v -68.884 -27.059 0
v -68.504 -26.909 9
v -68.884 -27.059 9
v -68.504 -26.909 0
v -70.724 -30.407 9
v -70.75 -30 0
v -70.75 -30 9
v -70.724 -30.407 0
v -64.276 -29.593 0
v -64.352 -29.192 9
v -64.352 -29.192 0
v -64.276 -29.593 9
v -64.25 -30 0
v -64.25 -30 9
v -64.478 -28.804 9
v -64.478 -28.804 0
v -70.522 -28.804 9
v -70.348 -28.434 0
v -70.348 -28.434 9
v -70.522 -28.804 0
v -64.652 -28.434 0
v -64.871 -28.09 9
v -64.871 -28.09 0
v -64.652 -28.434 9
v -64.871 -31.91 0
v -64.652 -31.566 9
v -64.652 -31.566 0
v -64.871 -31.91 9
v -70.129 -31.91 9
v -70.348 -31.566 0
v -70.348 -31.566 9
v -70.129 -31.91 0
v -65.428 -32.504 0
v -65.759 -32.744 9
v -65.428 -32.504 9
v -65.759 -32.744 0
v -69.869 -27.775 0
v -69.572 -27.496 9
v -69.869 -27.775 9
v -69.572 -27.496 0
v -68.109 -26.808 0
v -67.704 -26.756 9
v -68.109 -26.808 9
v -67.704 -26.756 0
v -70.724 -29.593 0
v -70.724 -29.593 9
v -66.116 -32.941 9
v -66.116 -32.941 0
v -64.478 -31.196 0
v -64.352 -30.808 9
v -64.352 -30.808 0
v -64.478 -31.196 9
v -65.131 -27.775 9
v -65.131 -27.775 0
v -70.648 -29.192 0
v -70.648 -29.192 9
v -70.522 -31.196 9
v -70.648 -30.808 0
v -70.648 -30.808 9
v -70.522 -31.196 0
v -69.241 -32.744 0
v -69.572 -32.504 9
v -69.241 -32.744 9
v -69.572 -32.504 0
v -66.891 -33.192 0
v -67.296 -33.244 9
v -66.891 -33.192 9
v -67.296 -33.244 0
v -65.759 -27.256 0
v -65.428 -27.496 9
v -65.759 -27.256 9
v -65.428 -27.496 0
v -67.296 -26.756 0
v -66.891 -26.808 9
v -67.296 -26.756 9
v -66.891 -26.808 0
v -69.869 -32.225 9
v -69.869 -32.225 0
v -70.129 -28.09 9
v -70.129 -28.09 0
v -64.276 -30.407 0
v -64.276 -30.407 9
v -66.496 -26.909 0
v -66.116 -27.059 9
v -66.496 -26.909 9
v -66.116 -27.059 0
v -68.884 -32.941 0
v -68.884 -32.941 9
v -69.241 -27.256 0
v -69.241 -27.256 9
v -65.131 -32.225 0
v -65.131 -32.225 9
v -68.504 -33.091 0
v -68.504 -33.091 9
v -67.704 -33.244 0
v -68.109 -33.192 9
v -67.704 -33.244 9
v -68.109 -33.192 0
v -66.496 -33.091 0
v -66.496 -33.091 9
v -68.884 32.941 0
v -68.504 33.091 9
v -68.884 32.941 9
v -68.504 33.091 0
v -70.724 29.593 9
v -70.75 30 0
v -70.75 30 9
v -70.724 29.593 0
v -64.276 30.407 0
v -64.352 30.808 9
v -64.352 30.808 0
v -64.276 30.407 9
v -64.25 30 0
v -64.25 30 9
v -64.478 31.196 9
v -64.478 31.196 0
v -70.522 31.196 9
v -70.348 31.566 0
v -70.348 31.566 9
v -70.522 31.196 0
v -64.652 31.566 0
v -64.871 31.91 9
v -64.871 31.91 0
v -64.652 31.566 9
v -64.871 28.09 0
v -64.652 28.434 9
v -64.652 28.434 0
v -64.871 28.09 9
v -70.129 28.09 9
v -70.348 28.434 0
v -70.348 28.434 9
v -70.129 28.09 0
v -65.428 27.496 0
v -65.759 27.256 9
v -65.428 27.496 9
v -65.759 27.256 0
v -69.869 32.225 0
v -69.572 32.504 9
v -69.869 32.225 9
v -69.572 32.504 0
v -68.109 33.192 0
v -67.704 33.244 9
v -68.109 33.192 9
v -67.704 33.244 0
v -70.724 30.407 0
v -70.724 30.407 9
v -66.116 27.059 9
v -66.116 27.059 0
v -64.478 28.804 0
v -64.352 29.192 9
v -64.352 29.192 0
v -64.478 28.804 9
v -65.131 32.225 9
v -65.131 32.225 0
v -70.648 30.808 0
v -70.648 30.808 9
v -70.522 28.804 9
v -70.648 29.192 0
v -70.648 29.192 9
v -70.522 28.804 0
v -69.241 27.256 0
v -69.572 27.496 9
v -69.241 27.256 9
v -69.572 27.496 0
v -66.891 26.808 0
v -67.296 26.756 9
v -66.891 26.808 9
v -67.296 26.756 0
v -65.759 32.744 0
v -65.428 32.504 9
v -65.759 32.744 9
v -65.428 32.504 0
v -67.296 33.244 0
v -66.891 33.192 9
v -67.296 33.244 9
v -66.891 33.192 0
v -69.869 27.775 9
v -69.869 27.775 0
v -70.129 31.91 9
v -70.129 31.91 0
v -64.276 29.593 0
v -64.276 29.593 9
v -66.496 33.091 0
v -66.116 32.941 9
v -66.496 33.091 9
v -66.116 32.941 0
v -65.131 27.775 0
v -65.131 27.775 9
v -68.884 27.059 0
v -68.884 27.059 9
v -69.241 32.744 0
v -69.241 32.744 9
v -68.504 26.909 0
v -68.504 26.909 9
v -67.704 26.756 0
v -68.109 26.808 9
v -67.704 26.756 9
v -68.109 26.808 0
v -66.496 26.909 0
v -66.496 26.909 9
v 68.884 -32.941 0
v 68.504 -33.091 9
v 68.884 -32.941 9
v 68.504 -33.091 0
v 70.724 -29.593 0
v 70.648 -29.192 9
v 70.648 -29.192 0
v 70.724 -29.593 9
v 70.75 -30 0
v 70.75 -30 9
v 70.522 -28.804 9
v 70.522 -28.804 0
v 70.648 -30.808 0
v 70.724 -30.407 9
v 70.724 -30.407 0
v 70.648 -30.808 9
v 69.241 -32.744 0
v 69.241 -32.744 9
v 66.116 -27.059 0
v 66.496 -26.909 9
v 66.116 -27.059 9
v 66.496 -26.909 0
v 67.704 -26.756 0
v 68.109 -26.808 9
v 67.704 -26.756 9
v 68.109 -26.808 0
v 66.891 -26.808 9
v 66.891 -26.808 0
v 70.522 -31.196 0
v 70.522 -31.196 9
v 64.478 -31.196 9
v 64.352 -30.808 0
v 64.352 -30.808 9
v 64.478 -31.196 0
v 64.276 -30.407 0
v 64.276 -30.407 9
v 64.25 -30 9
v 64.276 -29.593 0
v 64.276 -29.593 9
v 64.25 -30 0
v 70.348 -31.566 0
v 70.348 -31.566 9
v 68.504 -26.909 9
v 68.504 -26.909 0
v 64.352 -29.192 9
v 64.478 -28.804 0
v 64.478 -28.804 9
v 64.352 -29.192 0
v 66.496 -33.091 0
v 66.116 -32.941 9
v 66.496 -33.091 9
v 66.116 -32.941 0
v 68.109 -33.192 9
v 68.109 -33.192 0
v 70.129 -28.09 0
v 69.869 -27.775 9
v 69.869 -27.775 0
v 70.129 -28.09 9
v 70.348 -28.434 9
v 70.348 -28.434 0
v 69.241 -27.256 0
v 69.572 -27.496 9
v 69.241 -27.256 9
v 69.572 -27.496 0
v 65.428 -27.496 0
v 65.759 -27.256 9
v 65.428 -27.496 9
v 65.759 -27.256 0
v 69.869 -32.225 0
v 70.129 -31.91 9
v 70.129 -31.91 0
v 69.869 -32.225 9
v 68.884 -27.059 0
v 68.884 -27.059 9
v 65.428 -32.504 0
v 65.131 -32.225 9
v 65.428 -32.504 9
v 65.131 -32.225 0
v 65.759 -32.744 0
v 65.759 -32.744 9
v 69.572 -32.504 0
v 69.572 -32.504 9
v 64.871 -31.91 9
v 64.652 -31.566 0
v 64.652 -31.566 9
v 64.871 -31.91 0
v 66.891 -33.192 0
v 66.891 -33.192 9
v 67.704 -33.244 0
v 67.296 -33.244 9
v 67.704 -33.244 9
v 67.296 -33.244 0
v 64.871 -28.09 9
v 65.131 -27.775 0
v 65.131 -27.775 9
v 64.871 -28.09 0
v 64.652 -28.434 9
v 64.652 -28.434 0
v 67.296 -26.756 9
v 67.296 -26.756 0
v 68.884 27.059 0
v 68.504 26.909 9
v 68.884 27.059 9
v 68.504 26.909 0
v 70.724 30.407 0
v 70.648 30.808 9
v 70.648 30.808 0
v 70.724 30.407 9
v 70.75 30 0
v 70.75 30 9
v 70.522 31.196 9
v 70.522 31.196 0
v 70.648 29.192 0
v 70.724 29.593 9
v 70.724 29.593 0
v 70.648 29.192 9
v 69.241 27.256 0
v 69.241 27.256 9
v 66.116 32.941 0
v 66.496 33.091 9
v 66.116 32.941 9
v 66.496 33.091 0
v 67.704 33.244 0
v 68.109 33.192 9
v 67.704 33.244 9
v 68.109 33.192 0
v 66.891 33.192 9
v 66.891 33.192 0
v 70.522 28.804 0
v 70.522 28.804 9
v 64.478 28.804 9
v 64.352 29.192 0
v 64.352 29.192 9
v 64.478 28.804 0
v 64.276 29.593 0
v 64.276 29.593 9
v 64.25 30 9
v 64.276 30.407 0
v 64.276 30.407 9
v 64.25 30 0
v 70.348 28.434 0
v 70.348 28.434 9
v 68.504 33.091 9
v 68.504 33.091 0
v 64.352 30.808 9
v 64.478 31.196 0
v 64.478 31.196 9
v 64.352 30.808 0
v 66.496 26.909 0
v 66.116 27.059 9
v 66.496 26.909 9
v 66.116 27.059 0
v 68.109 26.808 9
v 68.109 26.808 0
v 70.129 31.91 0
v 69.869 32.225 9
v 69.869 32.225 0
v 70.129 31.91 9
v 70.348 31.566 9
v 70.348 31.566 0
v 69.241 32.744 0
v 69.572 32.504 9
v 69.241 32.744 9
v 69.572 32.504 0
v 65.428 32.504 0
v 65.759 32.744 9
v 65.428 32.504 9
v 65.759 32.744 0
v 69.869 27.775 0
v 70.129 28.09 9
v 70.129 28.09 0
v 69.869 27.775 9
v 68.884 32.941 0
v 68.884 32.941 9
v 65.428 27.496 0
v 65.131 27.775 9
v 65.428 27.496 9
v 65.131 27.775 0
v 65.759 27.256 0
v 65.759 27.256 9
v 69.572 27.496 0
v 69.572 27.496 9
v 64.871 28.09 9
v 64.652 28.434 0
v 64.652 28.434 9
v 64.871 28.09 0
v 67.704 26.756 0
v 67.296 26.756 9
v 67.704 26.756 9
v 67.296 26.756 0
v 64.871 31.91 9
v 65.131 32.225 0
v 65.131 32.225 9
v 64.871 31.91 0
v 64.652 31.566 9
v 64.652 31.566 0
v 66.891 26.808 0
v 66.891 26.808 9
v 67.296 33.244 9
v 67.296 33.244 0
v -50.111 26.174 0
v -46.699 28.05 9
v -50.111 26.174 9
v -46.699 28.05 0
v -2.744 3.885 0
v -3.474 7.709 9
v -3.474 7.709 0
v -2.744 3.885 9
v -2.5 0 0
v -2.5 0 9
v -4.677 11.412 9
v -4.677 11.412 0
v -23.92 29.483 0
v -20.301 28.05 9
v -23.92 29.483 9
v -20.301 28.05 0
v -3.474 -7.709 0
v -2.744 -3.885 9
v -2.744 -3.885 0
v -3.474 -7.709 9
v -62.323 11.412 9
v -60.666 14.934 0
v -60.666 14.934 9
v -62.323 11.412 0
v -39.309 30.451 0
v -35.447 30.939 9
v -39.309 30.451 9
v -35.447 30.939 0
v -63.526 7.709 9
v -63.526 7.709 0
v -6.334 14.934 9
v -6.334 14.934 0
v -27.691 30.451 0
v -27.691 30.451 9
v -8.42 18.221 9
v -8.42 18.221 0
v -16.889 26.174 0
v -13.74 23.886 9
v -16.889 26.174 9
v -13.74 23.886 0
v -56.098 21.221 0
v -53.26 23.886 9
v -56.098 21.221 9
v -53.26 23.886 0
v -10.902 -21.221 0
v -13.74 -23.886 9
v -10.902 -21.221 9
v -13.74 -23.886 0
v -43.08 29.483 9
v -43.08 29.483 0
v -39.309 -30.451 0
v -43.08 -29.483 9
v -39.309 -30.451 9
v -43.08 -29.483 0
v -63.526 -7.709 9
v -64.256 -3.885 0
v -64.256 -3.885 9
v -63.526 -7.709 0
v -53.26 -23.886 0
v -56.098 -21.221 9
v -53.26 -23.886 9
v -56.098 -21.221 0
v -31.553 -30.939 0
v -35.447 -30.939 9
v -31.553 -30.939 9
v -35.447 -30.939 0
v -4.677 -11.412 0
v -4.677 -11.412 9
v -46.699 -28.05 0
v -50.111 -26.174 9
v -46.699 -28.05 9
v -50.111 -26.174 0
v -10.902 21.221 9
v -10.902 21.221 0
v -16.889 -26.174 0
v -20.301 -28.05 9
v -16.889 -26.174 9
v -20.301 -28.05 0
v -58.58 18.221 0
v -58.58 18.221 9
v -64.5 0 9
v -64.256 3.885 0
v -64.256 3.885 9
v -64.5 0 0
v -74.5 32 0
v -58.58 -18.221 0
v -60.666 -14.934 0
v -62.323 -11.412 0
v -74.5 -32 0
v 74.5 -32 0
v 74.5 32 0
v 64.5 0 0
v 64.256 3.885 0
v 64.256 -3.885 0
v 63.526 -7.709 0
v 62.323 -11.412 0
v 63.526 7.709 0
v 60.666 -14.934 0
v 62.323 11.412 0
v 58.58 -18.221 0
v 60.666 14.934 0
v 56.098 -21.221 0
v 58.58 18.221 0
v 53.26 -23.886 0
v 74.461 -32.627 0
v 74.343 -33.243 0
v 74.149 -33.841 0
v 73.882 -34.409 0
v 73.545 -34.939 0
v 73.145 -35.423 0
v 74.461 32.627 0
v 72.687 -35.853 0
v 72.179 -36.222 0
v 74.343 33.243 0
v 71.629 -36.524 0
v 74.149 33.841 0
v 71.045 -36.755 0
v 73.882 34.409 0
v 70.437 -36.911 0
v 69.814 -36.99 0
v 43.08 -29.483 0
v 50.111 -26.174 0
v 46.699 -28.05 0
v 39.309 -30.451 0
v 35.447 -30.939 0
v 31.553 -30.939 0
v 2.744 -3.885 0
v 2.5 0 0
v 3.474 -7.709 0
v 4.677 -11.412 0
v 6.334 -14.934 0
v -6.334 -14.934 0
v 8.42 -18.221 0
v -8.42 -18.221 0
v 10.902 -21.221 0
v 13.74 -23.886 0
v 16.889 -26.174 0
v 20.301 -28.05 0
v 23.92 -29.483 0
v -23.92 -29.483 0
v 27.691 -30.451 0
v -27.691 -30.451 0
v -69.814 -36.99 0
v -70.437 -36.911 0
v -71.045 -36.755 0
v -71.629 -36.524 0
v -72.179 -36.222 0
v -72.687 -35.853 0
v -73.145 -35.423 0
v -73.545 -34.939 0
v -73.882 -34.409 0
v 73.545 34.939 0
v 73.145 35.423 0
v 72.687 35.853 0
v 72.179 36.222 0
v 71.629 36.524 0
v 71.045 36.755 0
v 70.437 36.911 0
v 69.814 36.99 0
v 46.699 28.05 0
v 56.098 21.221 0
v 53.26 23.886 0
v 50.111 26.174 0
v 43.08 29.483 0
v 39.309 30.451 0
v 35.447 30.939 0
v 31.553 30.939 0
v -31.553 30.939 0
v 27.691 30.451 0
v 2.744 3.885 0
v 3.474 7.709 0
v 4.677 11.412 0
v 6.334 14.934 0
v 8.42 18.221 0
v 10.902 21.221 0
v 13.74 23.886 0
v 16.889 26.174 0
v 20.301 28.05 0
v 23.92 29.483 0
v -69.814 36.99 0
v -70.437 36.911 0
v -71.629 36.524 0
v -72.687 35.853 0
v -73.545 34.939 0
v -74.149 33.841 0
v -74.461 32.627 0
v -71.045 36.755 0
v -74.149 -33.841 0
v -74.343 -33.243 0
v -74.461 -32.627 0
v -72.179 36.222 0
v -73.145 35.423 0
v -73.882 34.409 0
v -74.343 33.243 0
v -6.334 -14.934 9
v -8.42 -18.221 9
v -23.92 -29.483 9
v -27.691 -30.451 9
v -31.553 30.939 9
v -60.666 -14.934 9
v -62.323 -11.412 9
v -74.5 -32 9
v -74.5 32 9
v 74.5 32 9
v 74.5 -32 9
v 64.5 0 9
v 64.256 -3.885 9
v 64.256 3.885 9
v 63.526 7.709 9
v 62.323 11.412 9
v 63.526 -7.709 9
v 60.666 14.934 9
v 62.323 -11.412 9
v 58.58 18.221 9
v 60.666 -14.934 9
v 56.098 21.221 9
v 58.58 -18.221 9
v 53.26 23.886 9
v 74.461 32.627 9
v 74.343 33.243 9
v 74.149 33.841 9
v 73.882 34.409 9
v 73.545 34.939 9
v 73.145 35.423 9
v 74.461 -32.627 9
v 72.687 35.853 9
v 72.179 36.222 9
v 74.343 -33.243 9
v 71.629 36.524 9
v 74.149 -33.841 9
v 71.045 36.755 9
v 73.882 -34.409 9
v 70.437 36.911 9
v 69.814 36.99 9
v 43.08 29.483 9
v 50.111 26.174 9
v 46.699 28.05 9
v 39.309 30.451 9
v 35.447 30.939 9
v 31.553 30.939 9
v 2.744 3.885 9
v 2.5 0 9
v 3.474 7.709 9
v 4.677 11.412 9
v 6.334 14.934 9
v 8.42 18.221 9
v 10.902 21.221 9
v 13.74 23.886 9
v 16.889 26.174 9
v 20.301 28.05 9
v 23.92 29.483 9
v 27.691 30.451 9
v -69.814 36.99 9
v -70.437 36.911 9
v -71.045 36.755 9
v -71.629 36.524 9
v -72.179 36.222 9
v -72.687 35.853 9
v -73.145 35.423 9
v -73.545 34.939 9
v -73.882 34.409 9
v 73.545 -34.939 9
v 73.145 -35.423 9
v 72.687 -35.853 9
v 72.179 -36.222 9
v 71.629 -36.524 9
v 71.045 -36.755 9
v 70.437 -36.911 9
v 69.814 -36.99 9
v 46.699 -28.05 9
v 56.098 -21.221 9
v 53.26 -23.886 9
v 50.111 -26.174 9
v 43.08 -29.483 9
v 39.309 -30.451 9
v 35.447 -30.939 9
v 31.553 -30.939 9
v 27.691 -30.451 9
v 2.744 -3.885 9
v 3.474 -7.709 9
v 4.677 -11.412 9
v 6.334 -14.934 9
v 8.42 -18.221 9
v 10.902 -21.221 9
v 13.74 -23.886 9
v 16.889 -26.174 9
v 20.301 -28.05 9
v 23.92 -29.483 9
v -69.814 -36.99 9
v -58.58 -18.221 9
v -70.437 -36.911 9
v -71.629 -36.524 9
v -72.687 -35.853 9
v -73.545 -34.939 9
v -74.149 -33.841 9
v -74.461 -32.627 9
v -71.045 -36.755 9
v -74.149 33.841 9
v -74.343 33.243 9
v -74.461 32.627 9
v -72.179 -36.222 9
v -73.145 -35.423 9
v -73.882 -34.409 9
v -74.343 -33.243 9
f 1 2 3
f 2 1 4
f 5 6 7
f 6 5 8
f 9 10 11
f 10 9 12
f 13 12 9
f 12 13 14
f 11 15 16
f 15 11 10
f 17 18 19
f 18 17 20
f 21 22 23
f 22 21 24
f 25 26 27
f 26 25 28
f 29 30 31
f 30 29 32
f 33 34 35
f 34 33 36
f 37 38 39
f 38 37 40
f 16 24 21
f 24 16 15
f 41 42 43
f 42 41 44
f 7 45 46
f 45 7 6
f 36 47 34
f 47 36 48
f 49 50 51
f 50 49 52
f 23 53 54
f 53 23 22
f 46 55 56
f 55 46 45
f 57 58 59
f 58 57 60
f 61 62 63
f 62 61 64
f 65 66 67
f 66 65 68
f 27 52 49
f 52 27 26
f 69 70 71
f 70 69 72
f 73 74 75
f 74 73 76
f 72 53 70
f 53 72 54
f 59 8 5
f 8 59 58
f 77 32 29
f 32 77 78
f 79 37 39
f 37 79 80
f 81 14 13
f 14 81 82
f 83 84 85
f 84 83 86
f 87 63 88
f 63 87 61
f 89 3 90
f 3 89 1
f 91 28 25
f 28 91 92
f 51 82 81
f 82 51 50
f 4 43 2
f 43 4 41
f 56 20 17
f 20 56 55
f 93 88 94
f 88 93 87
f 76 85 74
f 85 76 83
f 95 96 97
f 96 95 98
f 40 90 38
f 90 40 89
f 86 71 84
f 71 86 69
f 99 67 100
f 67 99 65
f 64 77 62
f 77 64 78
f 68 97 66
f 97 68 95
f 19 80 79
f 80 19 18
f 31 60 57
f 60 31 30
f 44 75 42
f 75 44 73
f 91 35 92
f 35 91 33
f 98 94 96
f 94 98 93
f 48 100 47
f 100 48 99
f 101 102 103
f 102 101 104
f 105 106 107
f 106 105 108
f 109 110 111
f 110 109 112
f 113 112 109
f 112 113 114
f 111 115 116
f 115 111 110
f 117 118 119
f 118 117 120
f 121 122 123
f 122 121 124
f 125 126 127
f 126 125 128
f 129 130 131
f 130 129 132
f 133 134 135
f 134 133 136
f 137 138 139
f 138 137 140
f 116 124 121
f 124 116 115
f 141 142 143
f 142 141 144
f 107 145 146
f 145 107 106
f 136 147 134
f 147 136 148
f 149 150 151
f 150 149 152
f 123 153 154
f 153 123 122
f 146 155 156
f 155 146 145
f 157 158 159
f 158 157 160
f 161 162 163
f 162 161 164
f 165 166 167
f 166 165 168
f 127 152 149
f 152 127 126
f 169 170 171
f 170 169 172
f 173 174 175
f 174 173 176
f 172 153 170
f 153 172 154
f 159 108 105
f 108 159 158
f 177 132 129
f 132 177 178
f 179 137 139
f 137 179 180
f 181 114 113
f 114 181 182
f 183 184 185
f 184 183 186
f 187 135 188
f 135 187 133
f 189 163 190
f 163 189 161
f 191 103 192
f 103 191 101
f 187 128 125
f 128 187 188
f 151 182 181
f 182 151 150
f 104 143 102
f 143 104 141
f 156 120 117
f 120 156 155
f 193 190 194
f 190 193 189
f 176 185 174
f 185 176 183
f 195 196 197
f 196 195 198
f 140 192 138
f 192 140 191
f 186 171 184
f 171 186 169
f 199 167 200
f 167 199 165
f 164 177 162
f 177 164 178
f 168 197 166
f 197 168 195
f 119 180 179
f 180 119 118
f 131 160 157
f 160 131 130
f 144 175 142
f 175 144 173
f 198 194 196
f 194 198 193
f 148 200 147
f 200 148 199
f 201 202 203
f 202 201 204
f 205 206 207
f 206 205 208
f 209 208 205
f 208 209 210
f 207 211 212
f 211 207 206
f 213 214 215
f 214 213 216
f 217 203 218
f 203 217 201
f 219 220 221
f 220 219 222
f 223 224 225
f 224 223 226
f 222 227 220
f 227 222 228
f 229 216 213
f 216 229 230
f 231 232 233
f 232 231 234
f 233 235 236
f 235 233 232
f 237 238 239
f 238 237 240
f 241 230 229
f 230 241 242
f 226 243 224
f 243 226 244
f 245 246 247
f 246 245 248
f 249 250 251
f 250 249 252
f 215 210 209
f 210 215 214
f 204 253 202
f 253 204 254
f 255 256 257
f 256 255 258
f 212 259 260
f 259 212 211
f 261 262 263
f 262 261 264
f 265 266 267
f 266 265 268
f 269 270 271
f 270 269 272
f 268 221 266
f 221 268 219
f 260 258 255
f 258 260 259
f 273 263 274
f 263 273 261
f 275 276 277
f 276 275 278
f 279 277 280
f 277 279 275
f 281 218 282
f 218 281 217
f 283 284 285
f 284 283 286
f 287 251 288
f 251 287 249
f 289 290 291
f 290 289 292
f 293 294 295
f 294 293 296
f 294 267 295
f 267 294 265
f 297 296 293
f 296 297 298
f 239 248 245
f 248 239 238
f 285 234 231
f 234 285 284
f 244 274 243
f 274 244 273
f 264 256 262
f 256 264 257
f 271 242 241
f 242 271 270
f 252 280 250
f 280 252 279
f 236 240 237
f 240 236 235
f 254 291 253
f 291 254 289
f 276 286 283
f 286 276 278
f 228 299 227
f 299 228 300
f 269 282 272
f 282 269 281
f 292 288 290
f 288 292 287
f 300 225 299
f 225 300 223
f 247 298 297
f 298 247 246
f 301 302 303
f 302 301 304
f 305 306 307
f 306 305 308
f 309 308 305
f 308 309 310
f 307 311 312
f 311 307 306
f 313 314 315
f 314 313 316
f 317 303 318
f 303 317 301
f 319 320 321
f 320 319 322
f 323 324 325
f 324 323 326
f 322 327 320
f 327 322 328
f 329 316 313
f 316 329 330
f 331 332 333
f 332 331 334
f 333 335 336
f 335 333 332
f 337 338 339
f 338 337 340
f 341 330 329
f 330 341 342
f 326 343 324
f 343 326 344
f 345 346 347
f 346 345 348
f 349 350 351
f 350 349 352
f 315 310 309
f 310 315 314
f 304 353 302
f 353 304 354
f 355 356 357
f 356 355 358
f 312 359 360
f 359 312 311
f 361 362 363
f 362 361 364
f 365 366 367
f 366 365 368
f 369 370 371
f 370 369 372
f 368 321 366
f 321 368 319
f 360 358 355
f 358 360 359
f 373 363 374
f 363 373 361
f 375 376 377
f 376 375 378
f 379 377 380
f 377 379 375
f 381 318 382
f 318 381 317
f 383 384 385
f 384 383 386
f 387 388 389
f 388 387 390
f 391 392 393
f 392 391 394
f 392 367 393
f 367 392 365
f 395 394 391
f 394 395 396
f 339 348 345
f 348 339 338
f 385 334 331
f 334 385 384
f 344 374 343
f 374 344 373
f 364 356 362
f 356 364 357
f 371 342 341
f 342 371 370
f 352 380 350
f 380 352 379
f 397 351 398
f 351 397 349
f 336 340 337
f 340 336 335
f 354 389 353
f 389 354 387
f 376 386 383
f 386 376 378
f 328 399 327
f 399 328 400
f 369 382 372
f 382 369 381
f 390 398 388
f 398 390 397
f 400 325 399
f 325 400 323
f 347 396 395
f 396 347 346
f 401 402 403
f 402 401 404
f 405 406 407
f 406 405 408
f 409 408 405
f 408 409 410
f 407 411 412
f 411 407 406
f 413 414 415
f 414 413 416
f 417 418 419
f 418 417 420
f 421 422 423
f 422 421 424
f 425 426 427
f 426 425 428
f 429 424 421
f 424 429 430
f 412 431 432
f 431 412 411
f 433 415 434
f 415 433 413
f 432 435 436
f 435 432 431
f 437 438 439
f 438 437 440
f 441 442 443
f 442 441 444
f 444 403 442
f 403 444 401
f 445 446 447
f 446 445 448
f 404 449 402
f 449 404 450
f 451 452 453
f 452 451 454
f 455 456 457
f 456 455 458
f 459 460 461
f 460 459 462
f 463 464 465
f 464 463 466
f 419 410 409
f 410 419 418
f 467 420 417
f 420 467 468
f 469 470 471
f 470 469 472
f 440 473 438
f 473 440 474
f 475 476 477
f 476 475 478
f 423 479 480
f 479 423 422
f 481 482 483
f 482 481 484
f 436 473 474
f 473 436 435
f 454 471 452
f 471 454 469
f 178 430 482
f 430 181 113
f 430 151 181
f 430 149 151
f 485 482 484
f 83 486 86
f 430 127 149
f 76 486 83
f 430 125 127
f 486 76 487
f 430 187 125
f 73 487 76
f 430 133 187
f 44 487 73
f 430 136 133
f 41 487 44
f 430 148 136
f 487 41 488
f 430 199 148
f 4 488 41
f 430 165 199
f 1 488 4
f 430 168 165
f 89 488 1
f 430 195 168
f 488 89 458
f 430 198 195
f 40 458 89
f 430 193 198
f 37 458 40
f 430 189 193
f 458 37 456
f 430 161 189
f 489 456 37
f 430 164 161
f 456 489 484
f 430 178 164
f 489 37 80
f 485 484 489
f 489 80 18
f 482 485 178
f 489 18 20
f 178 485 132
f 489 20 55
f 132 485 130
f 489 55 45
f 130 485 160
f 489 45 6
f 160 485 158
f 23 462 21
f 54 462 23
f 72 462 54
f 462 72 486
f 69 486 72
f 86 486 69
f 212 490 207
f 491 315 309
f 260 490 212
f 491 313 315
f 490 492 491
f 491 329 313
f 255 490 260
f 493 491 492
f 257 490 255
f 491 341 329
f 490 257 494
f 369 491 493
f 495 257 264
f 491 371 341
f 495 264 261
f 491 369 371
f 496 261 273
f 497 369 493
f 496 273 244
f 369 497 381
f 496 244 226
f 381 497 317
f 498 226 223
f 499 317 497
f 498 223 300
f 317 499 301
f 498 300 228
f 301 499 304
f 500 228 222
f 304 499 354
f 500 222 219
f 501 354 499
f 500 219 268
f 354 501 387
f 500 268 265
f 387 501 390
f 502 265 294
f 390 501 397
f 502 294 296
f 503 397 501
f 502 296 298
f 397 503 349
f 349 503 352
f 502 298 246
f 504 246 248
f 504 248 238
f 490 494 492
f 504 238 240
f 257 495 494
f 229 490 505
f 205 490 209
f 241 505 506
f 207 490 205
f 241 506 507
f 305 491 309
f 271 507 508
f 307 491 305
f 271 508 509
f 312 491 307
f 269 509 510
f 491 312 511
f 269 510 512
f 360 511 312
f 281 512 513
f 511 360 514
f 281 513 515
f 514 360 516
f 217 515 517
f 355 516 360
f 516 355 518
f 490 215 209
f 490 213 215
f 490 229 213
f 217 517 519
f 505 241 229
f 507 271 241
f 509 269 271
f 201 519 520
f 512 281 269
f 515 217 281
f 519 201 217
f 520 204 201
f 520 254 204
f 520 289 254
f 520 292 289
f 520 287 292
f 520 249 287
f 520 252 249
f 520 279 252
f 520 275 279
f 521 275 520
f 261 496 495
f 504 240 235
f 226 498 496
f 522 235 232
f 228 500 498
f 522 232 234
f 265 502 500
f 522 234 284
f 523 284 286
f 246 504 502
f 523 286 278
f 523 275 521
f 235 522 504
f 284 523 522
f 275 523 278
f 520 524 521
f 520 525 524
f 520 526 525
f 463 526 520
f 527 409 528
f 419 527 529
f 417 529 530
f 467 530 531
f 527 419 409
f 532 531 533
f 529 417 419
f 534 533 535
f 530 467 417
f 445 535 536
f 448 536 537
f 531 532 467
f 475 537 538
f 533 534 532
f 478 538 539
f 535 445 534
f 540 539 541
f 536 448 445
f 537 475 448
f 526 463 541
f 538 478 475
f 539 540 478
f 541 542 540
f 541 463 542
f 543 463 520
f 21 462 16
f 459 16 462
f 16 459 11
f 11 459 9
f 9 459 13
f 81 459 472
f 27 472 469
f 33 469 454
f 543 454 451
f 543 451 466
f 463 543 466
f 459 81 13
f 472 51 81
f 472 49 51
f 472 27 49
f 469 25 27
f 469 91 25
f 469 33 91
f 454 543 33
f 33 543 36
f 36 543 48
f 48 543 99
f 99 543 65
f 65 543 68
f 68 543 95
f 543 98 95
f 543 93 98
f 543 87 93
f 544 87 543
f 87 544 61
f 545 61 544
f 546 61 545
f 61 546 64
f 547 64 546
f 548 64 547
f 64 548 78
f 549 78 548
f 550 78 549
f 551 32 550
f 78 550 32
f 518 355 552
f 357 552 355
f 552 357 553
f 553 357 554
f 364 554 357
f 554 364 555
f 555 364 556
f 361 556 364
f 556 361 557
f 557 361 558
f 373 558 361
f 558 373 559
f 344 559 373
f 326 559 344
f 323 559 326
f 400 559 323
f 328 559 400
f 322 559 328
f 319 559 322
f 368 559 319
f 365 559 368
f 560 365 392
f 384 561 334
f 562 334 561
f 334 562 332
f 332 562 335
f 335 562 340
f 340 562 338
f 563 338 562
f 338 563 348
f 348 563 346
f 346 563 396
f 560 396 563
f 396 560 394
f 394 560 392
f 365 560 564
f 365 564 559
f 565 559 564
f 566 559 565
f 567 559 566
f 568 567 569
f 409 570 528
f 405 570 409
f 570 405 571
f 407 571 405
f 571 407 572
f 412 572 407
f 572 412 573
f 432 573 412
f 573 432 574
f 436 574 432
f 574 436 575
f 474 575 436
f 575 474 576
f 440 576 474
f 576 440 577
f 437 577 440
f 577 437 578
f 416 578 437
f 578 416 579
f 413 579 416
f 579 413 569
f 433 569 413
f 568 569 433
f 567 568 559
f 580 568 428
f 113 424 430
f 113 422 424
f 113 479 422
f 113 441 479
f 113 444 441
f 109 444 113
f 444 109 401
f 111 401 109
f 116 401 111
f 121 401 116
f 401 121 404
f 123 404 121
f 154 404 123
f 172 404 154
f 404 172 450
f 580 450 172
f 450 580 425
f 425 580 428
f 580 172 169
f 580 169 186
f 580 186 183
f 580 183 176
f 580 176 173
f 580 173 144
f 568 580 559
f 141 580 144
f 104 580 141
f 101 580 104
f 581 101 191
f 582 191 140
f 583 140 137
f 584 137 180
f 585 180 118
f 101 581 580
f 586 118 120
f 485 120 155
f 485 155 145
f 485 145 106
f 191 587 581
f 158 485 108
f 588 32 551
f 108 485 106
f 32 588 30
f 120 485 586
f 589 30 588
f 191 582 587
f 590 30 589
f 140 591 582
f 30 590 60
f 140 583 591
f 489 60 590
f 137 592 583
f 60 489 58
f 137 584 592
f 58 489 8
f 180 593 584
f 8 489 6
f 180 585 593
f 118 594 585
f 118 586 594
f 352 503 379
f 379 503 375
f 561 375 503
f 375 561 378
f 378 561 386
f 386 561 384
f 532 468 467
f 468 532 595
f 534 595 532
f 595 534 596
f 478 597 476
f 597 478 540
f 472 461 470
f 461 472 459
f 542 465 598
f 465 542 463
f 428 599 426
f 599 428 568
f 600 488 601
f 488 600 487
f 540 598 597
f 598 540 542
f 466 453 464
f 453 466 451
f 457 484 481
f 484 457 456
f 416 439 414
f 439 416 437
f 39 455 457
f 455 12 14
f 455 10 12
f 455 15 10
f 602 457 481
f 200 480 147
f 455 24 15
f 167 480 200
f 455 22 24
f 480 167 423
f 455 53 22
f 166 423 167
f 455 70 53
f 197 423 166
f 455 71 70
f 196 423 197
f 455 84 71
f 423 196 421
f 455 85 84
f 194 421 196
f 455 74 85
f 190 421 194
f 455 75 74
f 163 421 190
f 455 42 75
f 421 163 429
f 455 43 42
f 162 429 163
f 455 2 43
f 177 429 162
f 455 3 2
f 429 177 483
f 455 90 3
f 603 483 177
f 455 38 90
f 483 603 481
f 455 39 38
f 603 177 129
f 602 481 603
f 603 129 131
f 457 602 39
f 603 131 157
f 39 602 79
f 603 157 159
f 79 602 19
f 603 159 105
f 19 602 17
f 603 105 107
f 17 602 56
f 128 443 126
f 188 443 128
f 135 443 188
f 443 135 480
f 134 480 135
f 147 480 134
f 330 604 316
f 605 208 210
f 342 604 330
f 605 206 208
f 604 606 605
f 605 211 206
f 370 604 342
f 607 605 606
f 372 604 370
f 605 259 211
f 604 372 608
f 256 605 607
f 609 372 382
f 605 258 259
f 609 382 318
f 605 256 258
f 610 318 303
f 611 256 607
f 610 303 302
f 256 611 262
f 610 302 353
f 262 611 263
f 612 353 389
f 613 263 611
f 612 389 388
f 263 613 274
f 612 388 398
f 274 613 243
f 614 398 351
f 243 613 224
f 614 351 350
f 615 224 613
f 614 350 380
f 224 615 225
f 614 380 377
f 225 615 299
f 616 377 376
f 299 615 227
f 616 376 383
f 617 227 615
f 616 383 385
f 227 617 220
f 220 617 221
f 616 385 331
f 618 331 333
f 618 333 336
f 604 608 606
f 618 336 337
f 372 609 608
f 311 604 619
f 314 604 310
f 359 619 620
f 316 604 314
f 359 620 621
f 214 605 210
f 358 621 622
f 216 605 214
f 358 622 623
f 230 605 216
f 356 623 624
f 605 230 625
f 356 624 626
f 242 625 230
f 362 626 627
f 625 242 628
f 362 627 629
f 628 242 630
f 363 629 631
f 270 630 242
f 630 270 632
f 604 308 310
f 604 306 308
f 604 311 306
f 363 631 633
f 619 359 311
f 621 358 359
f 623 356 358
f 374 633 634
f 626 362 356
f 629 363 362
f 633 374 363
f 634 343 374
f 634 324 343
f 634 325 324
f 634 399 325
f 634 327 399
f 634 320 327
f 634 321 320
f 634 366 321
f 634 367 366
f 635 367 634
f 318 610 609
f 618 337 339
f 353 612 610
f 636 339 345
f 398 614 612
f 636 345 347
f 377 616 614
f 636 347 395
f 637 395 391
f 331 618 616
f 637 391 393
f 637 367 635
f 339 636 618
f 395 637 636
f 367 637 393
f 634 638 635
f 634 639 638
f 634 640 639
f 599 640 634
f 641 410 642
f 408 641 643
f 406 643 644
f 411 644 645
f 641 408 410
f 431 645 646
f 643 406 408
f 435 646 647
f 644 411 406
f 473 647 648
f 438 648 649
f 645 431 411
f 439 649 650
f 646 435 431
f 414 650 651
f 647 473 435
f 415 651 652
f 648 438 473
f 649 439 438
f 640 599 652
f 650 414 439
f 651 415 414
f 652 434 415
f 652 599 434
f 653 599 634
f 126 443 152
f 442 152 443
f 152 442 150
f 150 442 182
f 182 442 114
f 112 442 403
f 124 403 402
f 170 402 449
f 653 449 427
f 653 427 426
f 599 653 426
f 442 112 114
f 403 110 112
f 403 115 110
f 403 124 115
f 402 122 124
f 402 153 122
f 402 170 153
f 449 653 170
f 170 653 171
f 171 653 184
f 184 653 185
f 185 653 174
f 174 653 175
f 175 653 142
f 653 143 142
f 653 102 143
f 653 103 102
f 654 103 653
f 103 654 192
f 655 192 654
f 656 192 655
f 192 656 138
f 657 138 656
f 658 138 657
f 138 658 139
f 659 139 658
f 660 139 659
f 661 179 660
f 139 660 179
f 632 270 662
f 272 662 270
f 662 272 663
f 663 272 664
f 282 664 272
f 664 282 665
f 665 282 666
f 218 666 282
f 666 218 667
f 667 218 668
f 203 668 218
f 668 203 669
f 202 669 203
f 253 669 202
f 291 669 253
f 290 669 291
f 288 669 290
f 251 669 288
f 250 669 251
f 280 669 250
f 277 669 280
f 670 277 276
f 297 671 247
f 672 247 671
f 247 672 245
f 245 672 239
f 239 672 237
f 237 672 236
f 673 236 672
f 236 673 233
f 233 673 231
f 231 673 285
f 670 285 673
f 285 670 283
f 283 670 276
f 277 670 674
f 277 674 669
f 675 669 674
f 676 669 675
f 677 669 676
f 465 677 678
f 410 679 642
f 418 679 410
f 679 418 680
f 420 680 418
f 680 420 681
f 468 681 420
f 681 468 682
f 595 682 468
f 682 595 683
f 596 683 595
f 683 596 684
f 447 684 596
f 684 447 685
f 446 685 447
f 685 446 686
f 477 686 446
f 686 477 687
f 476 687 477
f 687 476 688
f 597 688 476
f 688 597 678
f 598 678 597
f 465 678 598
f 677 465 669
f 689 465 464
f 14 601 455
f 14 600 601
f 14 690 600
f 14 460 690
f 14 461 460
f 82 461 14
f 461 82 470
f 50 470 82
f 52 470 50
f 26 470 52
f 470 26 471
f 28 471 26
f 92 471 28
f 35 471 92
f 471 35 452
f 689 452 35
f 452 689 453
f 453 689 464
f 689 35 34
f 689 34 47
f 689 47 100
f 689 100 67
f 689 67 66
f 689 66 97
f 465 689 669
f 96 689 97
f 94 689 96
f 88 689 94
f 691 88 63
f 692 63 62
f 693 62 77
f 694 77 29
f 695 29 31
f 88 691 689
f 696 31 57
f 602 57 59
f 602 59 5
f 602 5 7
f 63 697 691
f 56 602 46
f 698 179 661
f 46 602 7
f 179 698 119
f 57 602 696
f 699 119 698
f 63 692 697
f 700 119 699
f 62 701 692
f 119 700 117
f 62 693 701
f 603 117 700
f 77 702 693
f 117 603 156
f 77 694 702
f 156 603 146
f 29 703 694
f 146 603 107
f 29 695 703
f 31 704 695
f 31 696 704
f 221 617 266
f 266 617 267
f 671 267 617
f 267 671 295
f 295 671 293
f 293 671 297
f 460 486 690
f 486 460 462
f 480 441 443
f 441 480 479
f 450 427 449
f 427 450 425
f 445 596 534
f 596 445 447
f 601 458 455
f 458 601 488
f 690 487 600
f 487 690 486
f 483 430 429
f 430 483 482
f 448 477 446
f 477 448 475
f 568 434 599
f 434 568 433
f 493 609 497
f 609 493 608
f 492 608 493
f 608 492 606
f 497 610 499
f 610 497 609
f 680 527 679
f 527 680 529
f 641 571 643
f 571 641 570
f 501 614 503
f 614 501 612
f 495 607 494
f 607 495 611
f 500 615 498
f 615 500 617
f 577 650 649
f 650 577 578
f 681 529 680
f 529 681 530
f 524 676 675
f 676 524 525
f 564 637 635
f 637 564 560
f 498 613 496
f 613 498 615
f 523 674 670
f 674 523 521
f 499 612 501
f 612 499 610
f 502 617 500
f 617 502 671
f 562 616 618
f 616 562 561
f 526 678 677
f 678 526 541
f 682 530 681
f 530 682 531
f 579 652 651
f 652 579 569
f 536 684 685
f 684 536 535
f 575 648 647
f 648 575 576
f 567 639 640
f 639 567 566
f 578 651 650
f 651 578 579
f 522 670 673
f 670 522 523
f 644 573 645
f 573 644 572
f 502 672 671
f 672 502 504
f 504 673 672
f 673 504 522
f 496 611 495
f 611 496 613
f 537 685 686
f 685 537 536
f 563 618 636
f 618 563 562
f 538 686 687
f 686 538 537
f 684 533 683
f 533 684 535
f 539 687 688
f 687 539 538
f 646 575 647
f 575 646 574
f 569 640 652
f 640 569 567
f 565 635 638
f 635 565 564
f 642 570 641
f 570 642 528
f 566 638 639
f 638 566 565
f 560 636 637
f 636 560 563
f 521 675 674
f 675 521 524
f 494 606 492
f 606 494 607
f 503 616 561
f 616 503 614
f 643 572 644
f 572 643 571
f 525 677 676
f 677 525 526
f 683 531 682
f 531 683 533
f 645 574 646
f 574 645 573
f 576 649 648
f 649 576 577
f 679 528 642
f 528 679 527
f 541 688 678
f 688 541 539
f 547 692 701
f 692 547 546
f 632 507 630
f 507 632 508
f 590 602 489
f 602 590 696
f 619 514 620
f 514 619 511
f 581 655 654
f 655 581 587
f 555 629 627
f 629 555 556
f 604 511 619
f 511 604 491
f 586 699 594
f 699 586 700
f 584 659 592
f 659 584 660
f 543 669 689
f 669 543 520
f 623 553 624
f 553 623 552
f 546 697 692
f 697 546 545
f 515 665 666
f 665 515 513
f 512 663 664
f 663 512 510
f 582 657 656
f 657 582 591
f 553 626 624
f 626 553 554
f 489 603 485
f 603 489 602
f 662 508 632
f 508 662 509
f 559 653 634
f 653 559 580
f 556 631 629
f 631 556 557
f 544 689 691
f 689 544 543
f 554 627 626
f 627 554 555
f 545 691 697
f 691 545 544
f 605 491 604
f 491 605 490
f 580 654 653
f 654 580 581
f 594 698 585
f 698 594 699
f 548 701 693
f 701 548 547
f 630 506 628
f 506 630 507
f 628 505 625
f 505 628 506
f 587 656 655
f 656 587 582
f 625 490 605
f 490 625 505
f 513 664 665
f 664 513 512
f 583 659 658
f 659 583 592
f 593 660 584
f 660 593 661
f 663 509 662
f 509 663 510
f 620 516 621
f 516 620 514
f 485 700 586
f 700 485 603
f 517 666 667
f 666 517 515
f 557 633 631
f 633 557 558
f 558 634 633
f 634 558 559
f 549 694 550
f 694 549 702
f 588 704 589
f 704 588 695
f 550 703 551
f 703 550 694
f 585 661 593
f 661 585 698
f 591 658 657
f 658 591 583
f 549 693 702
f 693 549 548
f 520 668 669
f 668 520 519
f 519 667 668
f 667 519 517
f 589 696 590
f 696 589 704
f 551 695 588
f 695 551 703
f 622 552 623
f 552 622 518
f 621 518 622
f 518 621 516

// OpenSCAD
$fn = 50;

difference() {
	union() {
		hull() {
			translate(v = [-69.5, 32.0, 0]) {
				cylinder(h = 9, r = 5);
			}
			translate(v = [69.5, 32.0, 0]) {
				cylinder(h = 9, r = 5);
			}
			translate(v = [-69.5, -32.0, 0]) {
				cylinder(h = 9, r = 5);
			}
			translate(v = [69.5, -32.0, 0]) {
				cylinder(h = 9, r = 5);
			}
		}
	}
	union() {
		translate(v = [-67.5, -30.0, -100.0]) {
			cylinder(h = 200, r = 3.25);
		}
		translate(v = [-67.5, 30.0, -100.0]) {
			cylinder(h = 200, r = 3.25);
		}
		translate(v = [67.5, -30.0, -100.0]) {
			cylinder(h = 200, r = 3.25);
		}
		translate(v = [67.5, 30.0, -100.0]) {
			cylinder(h = 200, r = 3.25);
		}
		translate(v = [-67.5, -30.0, -100.0]) {
			cylinder(h = 200, r = 1.8);
		}
		translate(v = [-67.5, 30.0, -100.0]) {
			cylinder(h = 200, r = 1.8);
		}
		translate(v = [67.5, -30.0, -100.0]) {
			cylinder(h = 200, r = 1.8);
		}
		translate(v = [67.5, 30.0, -100.0]) {
			cylinder(h = 200, r = 1.8);
		}
		translate(v = [-33.5, 0, 0.0]) {
			cylinder(h = 9, r = 31.0);
		}
		translate(v = [33.5, 0, 0.0]) {
			cylinder(h = 9, r = 31.0);
		}
	}
}
